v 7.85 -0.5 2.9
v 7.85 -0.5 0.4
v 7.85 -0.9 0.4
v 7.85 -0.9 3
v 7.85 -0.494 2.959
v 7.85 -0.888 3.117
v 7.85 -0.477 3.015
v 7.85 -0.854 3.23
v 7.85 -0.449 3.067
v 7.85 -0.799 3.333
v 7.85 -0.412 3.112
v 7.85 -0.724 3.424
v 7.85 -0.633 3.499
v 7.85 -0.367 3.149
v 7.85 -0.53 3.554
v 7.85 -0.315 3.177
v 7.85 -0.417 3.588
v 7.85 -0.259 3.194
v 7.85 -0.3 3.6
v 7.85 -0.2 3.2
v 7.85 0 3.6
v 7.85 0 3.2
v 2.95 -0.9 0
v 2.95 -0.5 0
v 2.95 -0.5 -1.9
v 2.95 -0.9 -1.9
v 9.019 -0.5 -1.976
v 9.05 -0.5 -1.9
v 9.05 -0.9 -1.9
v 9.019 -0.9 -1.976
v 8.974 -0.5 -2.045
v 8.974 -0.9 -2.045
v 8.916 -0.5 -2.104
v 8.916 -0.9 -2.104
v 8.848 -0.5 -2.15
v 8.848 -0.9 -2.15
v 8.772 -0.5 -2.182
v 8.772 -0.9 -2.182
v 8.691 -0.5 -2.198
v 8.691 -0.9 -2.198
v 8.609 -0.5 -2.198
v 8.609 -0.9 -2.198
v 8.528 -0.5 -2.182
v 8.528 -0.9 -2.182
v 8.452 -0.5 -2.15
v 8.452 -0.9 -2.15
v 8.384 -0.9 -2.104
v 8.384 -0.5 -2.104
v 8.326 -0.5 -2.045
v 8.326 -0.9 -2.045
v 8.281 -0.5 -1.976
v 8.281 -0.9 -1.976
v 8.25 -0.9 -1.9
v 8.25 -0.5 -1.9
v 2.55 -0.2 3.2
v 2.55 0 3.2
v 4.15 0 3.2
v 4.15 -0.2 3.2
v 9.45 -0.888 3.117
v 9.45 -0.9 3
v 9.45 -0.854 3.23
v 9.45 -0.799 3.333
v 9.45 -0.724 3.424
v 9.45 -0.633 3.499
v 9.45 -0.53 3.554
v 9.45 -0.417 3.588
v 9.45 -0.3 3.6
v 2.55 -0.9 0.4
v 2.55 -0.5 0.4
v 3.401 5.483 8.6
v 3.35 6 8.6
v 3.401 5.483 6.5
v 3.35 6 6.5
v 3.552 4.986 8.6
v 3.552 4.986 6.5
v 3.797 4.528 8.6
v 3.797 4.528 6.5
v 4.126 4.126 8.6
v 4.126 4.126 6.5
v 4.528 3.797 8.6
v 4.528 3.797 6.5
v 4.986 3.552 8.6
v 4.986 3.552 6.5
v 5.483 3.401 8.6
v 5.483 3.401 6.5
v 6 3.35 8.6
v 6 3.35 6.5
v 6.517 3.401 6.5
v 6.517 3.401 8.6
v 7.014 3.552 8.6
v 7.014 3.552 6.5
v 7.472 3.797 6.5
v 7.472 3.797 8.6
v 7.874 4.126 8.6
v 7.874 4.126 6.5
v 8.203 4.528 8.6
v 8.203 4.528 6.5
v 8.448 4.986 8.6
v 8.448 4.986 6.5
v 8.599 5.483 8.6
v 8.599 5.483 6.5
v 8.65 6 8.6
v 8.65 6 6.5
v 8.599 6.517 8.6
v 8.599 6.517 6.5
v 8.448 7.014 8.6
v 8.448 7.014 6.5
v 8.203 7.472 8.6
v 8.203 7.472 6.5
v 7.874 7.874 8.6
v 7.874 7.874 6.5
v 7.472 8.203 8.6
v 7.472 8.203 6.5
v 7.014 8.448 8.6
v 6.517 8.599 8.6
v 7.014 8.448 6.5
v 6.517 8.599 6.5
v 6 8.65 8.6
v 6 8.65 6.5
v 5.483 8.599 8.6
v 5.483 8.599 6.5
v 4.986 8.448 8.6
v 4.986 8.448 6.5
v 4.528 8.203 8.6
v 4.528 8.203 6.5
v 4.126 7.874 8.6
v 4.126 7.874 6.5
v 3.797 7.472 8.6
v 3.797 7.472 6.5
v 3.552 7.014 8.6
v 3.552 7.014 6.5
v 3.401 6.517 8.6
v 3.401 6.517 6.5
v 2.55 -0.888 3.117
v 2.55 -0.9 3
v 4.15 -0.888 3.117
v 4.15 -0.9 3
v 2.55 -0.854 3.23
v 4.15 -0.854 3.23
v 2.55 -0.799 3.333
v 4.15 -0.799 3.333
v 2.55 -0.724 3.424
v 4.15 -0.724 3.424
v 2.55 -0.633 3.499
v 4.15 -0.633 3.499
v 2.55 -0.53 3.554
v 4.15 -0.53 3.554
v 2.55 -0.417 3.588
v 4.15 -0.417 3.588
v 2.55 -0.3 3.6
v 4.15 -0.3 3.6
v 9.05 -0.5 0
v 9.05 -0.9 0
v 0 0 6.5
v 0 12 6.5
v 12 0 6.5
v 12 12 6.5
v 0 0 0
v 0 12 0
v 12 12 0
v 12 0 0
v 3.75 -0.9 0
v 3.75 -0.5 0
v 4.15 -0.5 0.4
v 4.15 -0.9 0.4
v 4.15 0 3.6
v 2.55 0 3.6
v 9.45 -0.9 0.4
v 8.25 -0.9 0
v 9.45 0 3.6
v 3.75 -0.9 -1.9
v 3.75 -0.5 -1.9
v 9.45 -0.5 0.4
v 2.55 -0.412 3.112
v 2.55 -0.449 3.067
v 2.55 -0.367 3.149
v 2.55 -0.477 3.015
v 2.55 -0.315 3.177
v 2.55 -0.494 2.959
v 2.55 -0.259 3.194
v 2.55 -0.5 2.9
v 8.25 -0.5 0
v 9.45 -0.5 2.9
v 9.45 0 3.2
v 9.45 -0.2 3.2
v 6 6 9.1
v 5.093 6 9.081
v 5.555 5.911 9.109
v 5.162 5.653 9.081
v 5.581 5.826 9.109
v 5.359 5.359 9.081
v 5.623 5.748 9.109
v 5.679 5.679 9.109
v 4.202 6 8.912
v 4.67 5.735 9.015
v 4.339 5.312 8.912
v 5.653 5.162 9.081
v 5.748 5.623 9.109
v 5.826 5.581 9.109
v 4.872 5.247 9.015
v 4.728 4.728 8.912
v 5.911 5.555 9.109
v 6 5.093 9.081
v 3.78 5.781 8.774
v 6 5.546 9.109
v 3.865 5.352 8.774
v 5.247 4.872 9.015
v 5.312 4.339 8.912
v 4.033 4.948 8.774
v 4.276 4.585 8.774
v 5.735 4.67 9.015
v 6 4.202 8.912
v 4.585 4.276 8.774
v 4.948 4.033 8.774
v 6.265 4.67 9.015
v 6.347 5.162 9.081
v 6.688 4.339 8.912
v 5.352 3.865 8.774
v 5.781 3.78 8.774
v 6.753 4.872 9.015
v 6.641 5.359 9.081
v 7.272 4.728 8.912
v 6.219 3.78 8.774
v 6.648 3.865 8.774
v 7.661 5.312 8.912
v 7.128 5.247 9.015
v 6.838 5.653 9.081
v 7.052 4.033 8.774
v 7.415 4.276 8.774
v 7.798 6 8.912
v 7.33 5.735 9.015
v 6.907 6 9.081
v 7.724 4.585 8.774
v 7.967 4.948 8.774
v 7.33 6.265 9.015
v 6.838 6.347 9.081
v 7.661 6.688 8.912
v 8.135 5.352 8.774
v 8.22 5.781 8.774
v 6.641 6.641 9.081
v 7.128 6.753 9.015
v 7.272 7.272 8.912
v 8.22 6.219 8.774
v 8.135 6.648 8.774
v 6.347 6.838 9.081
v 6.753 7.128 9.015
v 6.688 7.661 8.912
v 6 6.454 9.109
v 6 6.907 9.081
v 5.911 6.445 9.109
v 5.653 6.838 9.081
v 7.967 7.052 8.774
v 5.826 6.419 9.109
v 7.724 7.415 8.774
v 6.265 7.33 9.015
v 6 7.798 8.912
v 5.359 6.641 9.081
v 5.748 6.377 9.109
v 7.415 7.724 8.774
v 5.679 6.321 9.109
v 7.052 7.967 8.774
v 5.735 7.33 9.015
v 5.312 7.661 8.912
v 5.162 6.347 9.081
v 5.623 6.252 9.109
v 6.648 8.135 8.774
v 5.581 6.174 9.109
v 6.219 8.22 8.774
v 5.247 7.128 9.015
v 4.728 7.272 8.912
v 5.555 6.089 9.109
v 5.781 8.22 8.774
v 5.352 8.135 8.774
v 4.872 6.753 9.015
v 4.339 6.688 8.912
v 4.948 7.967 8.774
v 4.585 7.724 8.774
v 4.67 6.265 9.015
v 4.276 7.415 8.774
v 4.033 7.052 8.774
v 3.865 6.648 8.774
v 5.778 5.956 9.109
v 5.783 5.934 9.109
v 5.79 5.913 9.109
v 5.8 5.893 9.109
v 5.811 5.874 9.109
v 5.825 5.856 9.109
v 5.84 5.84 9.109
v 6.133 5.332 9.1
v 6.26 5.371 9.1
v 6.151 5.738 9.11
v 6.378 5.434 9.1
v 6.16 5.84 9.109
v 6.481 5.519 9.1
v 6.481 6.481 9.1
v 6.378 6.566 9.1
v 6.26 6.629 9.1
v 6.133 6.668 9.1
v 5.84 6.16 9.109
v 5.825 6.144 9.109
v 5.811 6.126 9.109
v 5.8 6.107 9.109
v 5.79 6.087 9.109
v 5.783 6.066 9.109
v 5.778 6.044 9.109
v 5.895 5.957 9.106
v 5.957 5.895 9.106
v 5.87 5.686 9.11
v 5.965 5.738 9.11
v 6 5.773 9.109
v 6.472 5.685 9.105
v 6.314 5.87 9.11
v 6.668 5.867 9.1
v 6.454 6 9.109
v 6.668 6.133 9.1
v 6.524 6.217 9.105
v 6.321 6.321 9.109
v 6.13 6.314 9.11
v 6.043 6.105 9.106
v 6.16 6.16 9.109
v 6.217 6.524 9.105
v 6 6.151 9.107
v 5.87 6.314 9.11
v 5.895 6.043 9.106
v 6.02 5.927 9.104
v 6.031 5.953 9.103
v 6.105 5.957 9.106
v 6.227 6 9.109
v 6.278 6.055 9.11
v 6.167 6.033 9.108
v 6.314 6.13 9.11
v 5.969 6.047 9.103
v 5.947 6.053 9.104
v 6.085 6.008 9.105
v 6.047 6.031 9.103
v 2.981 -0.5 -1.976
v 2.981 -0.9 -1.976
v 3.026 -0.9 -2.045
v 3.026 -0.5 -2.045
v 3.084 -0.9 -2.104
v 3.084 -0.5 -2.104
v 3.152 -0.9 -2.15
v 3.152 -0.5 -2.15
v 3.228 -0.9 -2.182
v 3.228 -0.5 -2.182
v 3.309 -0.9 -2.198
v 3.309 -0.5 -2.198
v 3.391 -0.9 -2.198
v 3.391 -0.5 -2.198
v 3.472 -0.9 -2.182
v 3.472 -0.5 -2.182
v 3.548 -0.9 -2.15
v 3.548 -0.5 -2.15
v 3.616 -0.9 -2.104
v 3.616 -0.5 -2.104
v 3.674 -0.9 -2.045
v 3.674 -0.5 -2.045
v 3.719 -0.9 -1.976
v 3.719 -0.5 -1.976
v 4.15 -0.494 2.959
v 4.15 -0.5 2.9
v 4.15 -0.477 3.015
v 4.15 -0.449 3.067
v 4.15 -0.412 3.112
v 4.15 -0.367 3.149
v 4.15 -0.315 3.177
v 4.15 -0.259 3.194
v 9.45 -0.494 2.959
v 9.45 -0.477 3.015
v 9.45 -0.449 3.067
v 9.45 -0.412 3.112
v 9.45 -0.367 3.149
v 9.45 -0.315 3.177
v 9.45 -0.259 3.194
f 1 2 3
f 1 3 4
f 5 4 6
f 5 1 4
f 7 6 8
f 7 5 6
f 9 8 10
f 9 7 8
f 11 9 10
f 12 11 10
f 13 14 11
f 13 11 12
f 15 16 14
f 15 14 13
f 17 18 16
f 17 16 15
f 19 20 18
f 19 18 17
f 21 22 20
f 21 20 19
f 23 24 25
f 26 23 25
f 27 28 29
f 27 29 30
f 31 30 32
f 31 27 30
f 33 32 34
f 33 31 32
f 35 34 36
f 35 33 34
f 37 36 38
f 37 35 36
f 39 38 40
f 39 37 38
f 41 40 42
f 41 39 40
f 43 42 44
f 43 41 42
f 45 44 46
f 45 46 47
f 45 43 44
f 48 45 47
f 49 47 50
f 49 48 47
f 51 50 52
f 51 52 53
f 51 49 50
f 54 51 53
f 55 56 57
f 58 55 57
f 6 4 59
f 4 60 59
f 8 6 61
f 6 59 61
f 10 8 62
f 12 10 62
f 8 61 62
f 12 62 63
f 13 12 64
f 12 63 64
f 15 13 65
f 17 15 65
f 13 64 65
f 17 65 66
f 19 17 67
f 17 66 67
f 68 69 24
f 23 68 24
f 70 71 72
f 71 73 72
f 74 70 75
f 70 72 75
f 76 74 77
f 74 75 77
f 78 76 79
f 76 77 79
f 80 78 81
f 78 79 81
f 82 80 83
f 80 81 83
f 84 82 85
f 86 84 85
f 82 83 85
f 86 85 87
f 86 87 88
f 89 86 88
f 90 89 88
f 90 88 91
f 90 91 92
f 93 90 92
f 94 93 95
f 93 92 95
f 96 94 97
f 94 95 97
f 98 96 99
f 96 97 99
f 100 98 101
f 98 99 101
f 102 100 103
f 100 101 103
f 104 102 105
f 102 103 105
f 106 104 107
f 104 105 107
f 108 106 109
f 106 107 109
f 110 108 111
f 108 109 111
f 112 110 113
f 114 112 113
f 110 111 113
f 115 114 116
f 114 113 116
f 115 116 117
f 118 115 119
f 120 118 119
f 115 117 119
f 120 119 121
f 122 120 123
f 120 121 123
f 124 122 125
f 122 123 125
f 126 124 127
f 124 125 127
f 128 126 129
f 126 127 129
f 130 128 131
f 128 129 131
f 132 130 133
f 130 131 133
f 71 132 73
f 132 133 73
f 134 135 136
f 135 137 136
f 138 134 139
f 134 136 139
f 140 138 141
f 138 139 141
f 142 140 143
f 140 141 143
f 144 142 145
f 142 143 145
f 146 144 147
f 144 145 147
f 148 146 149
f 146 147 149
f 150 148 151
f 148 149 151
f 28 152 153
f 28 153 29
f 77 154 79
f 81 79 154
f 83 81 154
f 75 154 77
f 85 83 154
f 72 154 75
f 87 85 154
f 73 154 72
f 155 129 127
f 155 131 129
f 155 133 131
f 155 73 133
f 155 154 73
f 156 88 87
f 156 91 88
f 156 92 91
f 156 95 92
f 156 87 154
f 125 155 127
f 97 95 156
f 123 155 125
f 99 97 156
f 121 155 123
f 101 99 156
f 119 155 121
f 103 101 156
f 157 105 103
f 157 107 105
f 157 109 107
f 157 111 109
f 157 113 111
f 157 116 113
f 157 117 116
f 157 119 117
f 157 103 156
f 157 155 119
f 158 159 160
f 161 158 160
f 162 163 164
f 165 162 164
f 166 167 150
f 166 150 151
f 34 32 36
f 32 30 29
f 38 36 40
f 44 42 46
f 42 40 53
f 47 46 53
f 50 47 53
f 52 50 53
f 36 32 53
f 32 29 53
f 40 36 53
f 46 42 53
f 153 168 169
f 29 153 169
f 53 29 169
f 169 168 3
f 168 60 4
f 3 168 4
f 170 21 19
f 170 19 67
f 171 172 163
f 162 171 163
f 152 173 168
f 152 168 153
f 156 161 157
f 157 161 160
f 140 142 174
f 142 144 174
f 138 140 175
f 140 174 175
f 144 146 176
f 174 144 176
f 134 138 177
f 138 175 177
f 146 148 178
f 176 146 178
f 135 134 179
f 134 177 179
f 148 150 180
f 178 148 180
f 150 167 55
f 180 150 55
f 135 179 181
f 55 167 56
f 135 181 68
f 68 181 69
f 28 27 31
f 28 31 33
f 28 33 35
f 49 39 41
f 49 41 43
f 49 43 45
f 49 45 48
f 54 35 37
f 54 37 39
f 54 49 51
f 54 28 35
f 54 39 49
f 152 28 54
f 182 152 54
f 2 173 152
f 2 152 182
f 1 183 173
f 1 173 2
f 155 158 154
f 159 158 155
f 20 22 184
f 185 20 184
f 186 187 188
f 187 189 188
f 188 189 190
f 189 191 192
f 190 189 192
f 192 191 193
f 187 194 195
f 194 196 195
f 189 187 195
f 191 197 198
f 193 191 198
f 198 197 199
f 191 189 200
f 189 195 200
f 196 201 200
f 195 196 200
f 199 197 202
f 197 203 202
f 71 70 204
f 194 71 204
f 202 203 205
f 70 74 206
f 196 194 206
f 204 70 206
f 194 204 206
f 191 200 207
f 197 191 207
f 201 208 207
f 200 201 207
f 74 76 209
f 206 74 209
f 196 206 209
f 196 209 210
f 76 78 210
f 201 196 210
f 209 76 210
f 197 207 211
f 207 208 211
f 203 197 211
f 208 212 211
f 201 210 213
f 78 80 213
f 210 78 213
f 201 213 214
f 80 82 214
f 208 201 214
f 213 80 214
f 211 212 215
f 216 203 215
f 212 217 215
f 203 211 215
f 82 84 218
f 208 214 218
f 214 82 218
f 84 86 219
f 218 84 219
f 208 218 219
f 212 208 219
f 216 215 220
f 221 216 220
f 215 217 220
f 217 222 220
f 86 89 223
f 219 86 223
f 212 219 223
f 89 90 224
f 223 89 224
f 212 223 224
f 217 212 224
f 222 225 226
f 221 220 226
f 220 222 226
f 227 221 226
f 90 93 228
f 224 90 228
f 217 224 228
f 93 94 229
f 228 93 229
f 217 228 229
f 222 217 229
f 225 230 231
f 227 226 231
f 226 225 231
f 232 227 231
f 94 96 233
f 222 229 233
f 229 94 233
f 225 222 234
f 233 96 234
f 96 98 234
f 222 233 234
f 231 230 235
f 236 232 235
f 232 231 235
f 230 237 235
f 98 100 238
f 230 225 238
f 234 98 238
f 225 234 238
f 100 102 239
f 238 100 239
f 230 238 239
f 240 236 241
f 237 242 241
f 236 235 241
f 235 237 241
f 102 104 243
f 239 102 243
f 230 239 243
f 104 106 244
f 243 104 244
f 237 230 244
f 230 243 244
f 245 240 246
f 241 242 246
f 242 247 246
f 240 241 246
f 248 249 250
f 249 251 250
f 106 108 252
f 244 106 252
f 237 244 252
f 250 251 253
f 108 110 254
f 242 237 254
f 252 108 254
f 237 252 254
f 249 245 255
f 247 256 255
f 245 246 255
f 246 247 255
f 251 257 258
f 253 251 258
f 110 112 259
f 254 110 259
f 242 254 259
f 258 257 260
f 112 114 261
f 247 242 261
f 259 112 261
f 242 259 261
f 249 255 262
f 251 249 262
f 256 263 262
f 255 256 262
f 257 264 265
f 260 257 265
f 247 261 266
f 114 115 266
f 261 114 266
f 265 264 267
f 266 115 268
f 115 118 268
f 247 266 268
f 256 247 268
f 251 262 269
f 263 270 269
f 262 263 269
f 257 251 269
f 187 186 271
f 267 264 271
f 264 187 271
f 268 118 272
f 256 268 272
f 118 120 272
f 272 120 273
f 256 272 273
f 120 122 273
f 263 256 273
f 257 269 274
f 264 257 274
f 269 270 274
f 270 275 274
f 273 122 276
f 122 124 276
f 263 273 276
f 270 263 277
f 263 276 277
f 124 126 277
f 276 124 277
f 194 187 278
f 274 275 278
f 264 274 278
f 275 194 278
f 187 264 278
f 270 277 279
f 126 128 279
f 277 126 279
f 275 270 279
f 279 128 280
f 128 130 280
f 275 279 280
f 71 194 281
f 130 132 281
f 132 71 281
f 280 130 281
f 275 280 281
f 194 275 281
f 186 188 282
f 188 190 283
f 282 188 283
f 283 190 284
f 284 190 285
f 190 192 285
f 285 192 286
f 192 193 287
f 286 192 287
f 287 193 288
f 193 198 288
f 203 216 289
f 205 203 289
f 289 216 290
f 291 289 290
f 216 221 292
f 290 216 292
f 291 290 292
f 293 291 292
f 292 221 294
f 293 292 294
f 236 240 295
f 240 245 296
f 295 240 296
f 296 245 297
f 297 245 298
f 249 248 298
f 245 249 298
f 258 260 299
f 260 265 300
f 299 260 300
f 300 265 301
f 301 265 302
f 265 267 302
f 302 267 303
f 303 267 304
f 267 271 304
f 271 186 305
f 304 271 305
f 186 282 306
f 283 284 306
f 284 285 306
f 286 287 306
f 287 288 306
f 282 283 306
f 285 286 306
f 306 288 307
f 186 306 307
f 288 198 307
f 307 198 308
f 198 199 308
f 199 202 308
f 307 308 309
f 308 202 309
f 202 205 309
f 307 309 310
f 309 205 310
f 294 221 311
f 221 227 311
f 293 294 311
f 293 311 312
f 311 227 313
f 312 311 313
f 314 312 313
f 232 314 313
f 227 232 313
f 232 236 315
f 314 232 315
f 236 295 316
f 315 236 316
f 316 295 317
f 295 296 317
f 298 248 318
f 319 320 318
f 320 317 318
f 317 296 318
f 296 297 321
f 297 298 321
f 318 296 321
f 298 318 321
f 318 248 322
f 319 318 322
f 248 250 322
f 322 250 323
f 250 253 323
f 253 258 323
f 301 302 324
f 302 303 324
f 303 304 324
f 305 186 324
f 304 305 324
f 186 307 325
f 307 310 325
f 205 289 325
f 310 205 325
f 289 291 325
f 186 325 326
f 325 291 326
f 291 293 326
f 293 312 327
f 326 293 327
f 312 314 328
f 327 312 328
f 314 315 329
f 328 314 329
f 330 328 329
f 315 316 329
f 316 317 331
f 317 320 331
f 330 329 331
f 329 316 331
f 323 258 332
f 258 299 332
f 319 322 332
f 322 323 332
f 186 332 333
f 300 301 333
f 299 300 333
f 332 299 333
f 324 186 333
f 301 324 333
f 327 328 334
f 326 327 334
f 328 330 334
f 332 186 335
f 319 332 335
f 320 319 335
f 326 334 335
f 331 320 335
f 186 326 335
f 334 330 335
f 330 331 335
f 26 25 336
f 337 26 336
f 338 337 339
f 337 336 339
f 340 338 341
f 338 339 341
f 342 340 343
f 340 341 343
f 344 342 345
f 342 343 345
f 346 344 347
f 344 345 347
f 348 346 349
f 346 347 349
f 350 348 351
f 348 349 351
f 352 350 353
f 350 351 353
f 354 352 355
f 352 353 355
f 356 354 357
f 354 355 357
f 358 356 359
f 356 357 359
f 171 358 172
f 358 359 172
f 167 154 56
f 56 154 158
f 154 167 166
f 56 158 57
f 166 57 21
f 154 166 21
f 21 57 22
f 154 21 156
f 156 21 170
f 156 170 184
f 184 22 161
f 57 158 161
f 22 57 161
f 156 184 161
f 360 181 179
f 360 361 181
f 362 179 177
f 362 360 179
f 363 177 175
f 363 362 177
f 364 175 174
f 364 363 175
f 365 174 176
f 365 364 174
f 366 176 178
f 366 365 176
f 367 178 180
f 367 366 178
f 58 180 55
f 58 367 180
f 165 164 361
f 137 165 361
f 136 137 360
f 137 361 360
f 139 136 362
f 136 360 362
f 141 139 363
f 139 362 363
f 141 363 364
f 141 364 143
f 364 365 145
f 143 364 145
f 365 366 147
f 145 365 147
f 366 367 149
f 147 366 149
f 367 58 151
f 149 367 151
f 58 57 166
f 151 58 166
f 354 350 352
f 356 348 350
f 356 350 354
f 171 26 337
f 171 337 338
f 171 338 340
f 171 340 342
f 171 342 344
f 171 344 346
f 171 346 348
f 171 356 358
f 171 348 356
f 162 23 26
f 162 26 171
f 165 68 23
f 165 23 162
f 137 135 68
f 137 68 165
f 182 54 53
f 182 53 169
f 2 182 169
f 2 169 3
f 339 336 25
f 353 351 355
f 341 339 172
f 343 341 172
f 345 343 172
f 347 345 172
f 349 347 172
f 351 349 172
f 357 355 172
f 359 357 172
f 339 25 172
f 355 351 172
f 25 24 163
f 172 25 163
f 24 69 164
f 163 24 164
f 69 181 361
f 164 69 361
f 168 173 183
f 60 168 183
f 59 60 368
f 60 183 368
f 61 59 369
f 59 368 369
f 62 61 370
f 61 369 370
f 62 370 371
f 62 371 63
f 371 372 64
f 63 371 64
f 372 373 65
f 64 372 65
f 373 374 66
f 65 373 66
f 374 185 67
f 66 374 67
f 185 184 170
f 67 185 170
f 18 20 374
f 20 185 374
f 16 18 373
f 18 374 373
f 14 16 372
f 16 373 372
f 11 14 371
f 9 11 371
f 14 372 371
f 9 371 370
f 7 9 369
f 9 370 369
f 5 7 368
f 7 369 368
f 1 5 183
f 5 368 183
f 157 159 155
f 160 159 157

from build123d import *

# Parameters (mm, degrees)
SKETCH1_W           = 12
SKETCH1_H           = 12
BOSS_EXTRUDE1_DEPTH = 6.5
SKETCH5_W           = 1.6
SKETCH5_H           = 0.4
BOSS_EXTRUDE3_DEPTH = 0.5
SKETCH6_W           = 1.6
SKETCH6_H           = 0.4
BOSS_EXTRUDE4_DEPTH = 0.4
FILLET1_R           = 0.6
FILLET2_R           = 0.3


with BuildPart() as part:
    # Sketch1 → Boss-Extrude1 (new body)
    with BuildSketch(Plane.XY):
        with Locations((6, 6)):
            Rectangle(SKETCH1_W, SKETCH1_H)
    extrude(amount=BOSS_EXTRUDE1_DEPTH)

    # Sketch4 → Revolve1 (revolve)
    with BuildSketch(Plane(origin=(0, 6, 0), x_dir=(1, 0, 0), z_dir=(0, 1, 0))):
        with BuildLine():
            Line((3.35, -8.6), (3.35, -6.5))
            Line((3.35, -6.5), (6, -6.5))
            Line((6, -6.5), (6, -9.1))
            ThreePointArc((6, -9.1), (4.643872087, -9.014977939), (3.35, -8.6))
        make_face()
    revolve(axis=Axis((6, 6, 6.5), (0, 0, 1)))

    # Sketch5 → Boss-Extrude3 (add)
    with BuildSketch(Plane.XZ):
        with Locations((8.65, 3.4)):
            Rectangle(SKETCH5_W, SKETCH5_H)
        with Locations((3.35, 3.4)):
            Rectangle(SKETCH5_W, SKETCH5_H)
    extrude(amount=BOSS_EXTRUDE3_DEPTH)

    # Sketch6 → Boss-Extrude4 (add)
    with BuildSketch(Plane.XZ.offset(0.5)):
        with BuildLine():
            Line((2.95, 0), (2.95, -1.9))
            ThreePointArc((2.95, -1.9), (3.35, -2.2), (3.75, -1.9))
            Line((3.75, -1.9), (3.75, 0))
            Line((3.75, 0), (4.15, 0.4))
            Line((4.15, 0.4), (4.15, 3.2))
            Line((4.15, 3.2), (2.55, 3.2))
            Line((2.55, 3.2), (2.55, 0.4))
            Line((2.55, 0.4), (2.95, 0))
        make_face()
        with Locations((3.35, 3.4)):
            Rectangle(SKETCH6_W, SKETCH6_H)
        with BuildLine():
            ThreePointArc((9.05, -1.9), (8.65, -2.2), (8.25, -1.9))
            Line((8.25, -1.9), (8.25, 0))
            Line((8.25, 0), (7.85, 0.4))
            Line((7.85, 0.4), (7.85, 3.6))
            Line((7.85, 3.6), (9.45, 3.6))
            Line((9.45, 3.6), (9.45, 0.4))
            Line((9.45, 0.4), (9.05, 0))
            Line((9.05, 0), (9.05, -1.9))
        make_face()
    extrude(amount=BOSS_EXTRUDE4_DEPTH)

    # Fillet1
    fillet1_edges = [part.edges().sort_by_distance(p)[0] for p in [
        (3.35, -0.9, 3.6),
        (8.65, -0.9, 3.6),
    ]]
    fillet(fillet1_edges, radius=FILLET1_R)

    # Fillet2
    fillet2_edges = [part.edges().sort_by_distance(p)[0] for p in [
        (3.35, -0.5, 3.2),
        (8.65, -0.5, 3.2),
    ]]
    fillet(fillet2_edges, radius=FILLET2_R)


solid = part.part
